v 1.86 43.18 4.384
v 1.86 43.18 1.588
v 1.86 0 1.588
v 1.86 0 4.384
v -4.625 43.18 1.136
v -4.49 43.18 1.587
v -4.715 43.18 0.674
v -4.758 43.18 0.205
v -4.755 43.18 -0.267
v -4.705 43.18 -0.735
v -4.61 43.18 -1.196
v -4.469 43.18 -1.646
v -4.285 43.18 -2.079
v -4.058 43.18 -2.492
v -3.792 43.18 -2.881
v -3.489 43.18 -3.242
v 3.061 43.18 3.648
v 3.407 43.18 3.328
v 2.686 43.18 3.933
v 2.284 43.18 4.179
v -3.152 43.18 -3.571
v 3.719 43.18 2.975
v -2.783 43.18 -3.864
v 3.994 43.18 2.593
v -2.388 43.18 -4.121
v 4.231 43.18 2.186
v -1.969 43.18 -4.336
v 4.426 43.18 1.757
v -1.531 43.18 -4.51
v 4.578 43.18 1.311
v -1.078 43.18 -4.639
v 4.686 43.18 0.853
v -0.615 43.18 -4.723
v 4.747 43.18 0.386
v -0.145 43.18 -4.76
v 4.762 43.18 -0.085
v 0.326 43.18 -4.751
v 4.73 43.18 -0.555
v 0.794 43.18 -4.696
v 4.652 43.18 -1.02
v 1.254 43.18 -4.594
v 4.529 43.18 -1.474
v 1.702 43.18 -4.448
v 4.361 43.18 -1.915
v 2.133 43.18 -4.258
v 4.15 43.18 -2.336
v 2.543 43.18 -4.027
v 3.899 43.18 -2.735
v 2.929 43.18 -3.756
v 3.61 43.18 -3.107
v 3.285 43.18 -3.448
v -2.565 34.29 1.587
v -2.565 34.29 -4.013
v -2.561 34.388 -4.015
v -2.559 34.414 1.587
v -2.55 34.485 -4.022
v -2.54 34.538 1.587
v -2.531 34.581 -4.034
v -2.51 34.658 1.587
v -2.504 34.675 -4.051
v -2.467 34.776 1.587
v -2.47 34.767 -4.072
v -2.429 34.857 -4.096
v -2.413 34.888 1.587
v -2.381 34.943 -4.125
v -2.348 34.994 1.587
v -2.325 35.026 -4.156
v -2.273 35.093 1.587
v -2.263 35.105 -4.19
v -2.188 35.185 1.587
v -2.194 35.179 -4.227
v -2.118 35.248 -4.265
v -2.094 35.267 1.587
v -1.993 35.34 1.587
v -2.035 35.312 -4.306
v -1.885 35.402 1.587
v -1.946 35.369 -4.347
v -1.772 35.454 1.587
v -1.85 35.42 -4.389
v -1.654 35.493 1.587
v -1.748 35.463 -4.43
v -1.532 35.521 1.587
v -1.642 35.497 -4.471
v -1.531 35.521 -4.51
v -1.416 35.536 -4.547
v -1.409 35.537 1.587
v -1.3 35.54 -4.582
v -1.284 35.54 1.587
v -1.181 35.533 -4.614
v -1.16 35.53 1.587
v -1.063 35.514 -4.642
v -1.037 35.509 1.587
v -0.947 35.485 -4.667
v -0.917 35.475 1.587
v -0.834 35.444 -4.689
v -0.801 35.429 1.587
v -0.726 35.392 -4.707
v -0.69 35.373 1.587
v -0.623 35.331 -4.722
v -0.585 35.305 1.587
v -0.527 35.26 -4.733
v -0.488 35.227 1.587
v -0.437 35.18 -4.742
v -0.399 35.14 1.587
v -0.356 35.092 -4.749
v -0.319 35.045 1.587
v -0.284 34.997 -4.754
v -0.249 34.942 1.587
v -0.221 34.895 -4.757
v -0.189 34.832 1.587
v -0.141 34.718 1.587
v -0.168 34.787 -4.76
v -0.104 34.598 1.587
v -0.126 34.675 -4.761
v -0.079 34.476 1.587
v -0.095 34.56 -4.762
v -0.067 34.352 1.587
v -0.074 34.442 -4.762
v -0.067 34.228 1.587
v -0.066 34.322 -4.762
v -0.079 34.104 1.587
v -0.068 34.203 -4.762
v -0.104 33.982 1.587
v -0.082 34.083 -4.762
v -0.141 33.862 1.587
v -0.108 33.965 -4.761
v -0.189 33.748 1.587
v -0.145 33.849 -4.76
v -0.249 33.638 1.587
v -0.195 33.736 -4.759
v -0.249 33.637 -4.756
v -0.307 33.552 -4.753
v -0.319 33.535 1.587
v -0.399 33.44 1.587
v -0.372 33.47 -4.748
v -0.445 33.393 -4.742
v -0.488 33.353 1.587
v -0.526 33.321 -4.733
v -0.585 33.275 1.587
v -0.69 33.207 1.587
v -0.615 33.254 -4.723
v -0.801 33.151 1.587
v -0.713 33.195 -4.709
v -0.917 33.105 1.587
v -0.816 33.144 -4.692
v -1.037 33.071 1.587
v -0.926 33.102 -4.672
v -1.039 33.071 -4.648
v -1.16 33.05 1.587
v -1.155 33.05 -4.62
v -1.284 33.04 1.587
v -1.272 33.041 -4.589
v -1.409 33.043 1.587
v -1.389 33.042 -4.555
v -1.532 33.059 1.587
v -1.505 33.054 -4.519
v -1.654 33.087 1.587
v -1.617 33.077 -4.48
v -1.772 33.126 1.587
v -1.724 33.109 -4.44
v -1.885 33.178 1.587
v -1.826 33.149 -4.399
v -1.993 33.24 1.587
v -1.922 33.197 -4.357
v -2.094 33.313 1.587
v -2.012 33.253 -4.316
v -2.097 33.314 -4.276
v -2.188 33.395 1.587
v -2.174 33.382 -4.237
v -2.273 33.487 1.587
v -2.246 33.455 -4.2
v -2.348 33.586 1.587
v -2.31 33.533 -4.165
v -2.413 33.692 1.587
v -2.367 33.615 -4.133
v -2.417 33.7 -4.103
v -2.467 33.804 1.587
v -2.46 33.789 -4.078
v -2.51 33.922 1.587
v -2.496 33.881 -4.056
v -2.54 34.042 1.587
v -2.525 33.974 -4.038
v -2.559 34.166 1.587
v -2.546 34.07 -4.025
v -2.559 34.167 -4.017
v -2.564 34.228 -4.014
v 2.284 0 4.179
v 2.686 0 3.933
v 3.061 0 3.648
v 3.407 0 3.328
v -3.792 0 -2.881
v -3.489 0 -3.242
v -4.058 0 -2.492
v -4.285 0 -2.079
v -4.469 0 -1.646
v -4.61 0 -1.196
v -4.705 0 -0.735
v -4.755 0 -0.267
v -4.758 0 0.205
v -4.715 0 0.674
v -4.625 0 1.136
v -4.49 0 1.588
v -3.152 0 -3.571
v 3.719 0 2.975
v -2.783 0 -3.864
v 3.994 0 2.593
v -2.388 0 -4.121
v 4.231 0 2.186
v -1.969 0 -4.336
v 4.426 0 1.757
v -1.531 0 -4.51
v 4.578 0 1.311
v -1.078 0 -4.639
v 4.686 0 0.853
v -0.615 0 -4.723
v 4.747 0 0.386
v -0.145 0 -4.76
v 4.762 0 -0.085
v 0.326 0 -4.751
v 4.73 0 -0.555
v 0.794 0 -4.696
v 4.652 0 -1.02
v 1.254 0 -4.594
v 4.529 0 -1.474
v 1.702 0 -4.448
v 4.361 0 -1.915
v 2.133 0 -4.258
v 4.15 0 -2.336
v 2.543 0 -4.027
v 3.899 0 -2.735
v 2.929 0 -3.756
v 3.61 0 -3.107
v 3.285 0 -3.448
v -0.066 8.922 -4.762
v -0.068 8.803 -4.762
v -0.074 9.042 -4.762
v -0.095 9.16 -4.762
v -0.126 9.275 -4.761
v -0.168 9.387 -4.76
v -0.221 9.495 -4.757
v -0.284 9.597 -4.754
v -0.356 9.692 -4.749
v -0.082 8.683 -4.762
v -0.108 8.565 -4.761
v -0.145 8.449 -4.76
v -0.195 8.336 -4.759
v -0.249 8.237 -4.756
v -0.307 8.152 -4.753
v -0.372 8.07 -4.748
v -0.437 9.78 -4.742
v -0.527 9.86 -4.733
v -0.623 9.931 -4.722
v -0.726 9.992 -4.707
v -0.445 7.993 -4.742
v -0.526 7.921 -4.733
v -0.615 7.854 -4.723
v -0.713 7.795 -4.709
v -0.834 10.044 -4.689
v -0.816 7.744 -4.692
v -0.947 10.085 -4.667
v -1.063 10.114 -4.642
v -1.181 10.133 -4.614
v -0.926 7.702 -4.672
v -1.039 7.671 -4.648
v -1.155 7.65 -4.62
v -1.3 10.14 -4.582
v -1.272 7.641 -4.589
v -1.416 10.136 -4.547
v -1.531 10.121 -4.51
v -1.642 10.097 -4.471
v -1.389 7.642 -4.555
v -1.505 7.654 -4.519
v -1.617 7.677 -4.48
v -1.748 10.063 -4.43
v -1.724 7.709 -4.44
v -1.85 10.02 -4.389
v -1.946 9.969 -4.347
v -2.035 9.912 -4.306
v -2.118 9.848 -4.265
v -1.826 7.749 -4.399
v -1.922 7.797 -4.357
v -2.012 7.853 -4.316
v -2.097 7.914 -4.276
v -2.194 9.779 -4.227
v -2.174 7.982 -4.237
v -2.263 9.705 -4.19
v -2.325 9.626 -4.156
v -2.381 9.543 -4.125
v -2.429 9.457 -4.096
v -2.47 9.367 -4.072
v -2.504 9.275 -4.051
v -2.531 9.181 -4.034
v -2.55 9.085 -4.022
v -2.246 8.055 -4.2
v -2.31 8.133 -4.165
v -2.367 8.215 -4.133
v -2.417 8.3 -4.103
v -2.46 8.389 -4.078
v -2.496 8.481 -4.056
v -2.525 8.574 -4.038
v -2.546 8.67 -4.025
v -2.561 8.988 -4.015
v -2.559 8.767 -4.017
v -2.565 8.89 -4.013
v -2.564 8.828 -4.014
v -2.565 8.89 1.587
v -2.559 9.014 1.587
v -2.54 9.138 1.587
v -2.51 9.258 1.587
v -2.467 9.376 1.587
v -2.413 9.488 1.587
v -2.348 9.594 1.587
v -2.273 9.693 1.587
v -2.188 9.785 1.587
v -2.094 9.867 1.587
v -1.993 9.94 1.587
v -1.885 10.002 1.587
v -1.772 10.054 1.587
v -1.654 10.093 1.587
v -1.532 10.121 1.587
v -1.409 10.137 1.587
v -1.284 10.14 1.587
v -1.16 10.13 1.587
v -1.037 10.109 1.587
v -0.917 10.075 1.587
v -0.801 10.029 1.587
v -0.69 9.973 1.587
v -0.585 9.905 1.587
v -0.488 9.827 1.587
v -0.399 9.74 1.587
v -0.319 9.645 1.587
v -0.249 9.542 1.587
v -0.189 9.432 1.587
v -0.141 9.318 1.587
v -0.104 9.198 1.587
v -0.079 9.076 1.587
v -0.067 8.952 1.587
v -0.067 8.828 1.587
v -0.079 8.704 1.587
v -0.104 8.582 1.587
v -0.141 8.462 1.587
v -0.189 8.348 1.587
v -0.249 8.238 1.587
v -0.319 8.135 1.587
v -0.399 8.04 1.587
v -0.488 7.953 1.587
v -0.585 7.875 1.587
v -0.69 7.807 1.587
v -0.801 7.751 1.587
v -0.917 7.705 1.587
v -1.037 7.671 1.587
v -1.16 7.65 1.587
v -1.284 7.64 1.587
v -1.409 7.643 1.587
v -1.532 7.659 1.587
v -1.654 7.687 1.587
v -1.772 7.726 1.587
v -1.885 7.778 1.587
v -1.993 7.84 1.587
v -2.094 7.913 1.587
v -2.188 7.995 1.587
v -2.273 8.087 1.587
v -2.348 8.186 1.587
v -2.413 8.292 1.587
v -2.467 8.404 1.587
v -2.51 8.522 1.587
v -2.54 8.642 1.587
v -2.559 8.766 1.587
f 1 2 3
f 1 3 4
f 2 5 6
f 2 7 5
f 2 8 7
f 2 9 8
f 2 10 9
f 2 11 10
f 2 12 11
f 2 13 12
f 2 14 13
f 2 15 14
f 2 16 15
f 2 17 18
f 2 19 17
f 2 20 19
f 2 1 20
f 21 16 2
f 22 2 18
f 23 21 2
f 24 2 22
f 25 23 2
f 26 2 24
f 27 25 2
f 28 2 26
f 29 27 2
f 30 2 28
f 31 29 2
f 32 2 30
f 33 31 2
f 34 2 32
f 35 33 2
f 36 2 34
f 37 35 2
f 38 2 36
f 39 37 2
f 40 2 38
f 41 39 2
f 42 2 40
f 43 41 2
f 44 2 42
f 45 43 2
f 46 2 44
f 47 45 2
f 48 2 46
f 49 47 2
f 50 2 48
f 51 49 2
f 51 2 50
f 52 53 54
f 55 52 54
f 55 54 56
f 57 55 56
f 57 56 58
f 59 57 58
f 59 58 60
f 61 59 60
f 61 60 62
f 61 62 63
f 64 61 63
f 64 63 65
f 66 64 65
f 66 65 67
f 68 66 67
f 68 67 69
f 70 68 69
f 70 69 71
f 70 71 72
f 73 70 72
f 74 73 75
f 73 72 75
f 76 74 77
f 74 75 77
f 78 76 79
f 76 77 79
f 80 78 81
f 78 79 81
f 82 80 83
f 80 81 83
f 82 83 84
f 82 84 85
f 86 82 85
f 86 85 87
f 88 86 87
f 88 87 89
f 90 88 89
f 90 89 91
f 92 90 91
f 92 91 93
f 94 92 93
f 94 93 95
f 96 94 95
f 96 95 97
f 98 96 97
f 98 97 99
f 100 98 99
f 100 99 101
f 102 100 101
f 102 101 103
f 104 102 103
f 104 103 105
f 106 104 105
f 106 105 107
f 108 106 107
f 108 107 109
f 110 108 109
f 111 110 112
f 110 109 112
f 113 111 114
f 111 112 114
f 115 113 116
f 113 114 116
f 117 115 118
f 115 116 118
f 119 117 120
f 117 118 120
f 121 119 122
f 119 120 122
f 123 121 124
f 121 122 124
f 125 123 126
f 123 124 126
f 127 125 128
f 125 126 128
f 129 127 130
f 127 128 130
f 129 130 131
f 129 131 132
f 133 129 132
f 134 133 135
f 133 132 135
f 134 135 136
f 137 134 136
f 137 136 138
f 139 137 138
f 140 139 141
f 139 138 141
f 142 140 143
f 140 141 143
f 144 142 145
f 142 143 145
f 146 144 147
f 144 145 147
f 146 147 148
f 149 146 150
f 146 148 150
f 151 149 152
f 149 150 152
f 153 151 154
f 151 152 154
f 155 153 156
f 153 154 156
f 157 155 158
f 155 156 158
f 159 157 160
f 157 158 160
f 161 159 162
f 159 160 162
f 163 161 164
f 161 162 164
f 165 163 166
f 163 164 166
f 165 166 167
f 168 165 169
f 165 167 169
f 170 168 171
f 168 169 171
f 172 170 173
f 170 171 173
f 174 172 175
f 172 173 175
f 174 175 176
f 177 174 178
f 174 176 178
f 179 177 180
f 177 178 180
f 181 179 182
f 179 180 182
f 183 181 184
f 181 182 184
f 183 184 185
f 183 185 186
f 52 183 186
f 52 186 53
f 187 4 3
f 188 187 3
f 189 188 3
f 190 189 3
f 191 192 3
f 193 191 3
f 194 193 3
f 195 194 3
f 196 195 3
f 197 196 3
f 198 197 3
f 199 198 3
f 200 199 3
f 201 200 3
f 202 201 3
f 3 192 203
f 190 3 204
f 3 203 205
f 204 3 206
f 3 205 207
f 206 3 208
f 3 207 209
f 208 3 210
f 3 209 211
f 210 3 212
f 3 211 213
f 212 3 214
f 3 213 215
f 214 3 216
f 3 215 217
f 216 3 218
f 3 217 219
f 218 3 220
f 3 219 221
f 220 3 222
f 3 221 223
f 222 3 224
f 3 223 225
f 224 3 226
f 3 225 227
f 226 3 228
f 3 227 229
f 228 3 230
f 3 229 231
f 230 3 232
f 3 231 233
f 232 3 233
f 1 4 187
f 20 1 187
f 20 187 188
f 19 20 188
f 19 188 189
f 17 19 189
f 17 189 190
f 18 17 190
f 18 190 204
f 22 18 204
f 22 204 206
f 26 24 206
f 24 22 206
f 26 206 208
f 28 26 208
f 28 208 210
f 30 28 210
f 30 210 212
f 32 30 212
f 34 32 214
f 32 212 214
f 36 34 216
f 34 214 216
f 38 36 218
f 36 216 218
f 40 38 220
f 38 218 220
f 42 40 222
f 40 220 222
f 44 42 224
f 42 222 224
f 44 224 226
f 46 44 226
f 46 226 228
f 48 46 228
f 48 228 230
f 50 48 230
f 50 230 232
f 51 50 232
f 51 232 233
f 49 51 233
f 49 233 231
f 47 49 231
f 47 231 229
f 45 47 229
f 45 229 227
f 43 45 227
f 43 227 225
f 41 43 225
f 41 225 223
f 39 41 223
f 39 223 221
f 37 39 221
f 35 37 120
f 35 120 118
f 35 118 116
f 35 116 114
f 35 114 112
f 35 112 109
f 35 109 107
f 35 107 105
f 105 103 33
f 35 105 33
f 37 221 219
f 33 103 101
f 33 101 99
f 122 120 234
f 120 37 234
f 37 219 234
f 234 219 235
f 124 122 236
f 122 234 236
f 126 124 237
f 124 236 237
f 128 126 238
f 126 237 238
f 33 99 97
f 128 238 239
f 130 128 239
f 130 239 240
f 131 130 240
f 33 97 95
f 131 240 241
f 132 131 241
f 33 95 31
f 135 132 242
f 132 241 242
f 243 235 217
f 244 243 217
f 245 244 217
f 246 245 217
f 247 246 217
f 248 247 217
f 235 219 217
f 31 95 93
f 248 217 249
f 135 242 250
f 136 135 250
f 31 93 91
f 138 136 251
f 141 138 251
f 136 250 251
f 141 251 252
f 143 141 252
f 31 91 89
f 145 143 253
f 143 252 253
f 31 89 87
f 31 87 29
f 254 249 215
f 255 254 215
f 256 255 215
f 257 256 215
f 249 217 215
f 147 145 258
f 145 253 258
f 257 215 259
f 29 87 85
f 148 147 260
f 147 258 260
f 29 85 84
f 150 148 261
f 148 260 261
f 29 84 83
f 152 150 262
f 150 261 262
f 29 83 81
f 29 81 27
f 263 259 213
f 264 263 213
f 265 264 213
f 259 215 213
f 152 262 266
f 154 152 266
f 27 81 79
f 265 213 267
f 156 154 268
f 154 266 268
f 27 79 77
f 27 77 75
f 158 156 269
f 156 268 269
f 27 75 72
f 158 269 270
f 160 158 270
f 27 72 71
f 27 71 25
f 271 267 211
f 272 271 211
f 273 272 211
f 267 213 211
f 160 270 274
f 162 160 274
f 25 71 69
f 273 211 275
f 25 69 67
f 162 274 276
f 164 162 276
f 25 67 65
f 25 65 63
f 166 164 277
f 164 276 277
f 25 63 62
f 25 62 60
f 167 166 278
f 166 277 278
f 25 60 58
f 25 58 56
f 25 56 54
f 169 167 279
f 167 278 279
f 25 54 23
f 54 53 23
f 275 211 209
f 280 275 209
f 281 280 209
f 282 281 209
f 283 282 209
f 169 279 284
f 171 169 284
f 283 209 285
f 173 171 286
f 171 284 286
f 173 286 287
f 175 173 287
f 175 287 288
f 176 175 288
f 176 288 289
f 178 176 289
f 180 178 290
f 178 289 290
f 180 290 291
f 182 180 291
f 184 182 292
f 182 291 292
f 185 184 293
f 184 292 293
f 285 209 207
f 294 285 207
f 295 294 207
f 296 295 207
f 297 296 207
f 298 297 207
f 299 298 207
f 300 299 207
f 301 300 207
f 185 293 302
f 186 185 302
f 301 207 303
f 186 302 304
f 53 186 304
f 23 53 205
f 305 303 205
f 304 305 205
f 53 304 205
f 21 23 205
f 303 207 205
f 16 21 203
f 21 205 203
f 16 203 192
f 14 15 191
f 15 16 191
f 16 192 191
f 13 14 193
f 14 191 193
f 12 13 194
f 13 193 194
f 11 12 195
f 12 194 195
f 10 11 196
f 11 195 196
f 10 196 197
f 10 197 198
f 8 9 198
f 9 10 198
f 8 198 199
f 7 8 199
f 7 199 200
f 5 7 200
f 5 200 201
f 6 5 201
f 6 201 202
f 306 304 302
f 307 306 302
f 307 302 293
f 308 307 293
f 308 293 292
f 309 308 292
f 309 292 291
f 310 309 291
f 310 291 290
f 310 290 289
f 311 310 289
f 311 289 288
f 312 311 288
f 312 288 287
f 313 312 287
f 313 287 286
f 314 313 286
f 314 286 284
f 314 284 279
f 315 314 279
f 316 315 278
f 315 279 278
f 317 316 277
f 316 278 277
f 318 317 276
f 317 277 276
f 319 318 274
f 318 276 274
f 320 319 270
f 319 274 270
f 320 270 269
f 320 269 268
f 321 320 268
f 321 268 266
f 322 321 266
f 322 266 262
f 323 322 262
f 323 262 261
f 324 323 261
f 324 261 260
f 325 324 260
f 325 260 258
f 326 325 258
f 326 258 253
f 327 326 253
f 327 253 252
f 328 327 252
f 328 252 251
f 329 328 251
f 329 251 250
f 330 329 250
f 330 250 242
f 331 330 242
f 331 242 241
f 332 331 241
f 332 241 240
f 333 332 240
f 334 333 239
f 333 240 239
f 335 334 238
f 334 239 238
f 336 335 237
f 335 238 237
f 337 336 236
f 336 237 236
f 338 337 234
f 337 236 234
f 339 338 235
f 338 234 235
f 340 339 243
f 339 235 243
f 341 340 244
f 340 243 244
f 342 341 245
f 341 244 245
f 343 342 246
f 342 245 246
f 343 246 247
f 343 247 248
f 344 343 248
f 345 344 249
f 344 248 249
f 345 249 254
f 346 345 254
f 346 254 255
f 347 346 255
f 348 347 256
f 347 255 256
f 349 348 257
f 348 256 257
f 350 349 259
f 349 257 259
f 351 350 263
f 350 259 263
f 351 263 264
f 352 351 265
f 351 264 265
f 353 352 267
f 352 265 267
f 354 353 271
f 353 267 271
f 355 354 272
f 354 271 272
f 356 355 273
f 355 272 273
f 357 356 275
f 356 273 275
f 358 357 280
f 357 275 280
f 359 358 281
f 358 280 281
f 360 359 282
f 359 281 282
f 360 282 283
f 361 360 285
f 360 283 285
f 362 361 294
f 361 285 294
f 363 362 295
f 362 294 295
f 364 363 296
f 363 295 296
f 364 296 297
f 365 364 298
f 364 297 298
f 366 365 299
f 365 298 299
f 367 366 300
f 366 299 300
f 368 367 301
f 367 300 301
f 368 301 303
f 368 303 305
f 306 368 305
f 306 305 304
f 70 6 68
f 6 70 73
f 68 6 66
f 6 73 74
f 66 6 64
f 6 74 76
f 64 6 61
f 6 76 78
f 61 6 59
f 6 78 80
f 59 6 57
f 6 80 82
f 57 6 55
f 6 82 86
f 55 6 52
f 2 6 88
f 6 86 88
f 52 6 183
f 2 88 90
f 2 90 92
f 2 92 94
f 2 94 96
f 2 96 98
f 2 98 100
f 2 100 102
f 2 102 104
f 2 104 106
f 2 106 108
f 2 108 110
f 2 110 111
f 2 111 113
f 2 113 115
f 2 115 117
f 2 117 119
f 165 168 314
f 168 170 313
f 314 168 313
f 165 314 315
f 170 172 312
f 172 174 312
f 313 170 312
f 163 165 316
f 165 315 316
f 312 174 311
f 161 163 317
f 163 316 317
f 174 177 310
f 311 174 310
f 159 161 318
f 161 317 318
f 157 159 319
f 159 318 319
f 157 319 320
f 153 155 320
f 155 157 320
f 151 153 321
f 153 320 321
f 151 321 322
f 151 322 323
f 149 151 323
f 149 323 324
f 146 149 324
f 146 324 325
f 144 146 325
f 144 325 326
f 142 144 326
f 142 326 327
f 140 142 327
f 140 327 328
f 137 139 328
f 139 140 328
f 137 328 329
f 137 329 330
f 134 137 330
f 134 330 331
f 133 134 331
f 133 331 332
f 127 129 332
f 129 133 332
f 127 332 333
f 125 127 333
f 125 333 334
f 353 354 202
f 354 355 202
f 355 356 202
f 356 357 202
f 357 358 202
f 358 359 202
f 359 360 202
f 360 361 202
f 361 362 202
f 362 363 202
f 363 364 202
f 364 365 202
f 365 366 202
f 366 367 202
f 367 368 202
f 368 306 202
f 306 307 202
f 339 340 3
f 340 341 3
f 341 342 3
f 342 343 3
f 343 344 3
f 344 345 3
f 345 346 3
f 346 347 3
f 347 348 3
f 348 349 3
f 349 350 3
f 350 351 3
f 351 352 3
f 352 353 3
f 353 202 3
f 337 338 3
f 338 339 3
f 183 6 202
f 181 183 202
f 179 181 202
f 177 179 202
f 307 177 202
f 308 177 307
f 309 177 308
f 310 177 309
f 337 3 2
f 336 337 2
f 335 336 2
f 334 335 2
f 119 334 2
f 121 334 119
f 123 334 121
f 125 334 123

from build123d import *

# Parameters (mm, degrees)
PROFILE_SKETCH_R       = 4.7625
BOSS_EXTRUDE1_DEPTH    = 43.18
PLATE_RELIEF_CUT_REACH = 45.18
PLATE_RELIEF_SKETCH_W  = 6.35
PLATE_RELIEF_SKETCH_H  = 3.175
M3X0_5_TAPPED_HOLE1_D  = 2.5


with BuildPart() as part:
    # Profile Sketch → Boss-Extrude1 (new body)
    with BuildSketch(Plane(origin=(0, 0, 0), x_dir=(1, 0, 0), z_dir=(0, 1, 0))):
        Circle(PROFILE_SKETCH_R)
    extrude(amount=BOSS_EXTRUDE1_DEPTH)

    # Plate Relief Sketch → Plate Relief Cut (cut, up to next)
    with BuildSketch(Plane.XZ, mode=Mode.PRIVATE) as plate_relief_cut_sk1:
        with Locations((-1.315128061, 3.175)):
            Rectangle(PLATE_RELIEF_SKETCH_W, PLATE_RELIEF_SKETCH_H)
    plate_relief_cut_tool1 = extrude(plate_relief_cut_sk1.sketch, amount=-PLATE_RELIEF_CUT_REACH, mode=Mode.PRIVATE) & part.part
    add(plate_relief_cut_tool1.solids().sort_by_distance((-1.315128, 0, 3.175))[0], mode=Mode.SUBTRACT)

    # M3x0.5 Tapped Hole1 (through all)
    with Locations(Plane(origin=(-1.315128061, 34.29, 1.5875), x_dir=(1, 0, 0), z_dir=(0, 0, 1))):
        with Locations((0, 0), (0, -25.4)):
            Hole(M3X0_5_TAPPED_HOLE1_D / 2)


solid = part.part
